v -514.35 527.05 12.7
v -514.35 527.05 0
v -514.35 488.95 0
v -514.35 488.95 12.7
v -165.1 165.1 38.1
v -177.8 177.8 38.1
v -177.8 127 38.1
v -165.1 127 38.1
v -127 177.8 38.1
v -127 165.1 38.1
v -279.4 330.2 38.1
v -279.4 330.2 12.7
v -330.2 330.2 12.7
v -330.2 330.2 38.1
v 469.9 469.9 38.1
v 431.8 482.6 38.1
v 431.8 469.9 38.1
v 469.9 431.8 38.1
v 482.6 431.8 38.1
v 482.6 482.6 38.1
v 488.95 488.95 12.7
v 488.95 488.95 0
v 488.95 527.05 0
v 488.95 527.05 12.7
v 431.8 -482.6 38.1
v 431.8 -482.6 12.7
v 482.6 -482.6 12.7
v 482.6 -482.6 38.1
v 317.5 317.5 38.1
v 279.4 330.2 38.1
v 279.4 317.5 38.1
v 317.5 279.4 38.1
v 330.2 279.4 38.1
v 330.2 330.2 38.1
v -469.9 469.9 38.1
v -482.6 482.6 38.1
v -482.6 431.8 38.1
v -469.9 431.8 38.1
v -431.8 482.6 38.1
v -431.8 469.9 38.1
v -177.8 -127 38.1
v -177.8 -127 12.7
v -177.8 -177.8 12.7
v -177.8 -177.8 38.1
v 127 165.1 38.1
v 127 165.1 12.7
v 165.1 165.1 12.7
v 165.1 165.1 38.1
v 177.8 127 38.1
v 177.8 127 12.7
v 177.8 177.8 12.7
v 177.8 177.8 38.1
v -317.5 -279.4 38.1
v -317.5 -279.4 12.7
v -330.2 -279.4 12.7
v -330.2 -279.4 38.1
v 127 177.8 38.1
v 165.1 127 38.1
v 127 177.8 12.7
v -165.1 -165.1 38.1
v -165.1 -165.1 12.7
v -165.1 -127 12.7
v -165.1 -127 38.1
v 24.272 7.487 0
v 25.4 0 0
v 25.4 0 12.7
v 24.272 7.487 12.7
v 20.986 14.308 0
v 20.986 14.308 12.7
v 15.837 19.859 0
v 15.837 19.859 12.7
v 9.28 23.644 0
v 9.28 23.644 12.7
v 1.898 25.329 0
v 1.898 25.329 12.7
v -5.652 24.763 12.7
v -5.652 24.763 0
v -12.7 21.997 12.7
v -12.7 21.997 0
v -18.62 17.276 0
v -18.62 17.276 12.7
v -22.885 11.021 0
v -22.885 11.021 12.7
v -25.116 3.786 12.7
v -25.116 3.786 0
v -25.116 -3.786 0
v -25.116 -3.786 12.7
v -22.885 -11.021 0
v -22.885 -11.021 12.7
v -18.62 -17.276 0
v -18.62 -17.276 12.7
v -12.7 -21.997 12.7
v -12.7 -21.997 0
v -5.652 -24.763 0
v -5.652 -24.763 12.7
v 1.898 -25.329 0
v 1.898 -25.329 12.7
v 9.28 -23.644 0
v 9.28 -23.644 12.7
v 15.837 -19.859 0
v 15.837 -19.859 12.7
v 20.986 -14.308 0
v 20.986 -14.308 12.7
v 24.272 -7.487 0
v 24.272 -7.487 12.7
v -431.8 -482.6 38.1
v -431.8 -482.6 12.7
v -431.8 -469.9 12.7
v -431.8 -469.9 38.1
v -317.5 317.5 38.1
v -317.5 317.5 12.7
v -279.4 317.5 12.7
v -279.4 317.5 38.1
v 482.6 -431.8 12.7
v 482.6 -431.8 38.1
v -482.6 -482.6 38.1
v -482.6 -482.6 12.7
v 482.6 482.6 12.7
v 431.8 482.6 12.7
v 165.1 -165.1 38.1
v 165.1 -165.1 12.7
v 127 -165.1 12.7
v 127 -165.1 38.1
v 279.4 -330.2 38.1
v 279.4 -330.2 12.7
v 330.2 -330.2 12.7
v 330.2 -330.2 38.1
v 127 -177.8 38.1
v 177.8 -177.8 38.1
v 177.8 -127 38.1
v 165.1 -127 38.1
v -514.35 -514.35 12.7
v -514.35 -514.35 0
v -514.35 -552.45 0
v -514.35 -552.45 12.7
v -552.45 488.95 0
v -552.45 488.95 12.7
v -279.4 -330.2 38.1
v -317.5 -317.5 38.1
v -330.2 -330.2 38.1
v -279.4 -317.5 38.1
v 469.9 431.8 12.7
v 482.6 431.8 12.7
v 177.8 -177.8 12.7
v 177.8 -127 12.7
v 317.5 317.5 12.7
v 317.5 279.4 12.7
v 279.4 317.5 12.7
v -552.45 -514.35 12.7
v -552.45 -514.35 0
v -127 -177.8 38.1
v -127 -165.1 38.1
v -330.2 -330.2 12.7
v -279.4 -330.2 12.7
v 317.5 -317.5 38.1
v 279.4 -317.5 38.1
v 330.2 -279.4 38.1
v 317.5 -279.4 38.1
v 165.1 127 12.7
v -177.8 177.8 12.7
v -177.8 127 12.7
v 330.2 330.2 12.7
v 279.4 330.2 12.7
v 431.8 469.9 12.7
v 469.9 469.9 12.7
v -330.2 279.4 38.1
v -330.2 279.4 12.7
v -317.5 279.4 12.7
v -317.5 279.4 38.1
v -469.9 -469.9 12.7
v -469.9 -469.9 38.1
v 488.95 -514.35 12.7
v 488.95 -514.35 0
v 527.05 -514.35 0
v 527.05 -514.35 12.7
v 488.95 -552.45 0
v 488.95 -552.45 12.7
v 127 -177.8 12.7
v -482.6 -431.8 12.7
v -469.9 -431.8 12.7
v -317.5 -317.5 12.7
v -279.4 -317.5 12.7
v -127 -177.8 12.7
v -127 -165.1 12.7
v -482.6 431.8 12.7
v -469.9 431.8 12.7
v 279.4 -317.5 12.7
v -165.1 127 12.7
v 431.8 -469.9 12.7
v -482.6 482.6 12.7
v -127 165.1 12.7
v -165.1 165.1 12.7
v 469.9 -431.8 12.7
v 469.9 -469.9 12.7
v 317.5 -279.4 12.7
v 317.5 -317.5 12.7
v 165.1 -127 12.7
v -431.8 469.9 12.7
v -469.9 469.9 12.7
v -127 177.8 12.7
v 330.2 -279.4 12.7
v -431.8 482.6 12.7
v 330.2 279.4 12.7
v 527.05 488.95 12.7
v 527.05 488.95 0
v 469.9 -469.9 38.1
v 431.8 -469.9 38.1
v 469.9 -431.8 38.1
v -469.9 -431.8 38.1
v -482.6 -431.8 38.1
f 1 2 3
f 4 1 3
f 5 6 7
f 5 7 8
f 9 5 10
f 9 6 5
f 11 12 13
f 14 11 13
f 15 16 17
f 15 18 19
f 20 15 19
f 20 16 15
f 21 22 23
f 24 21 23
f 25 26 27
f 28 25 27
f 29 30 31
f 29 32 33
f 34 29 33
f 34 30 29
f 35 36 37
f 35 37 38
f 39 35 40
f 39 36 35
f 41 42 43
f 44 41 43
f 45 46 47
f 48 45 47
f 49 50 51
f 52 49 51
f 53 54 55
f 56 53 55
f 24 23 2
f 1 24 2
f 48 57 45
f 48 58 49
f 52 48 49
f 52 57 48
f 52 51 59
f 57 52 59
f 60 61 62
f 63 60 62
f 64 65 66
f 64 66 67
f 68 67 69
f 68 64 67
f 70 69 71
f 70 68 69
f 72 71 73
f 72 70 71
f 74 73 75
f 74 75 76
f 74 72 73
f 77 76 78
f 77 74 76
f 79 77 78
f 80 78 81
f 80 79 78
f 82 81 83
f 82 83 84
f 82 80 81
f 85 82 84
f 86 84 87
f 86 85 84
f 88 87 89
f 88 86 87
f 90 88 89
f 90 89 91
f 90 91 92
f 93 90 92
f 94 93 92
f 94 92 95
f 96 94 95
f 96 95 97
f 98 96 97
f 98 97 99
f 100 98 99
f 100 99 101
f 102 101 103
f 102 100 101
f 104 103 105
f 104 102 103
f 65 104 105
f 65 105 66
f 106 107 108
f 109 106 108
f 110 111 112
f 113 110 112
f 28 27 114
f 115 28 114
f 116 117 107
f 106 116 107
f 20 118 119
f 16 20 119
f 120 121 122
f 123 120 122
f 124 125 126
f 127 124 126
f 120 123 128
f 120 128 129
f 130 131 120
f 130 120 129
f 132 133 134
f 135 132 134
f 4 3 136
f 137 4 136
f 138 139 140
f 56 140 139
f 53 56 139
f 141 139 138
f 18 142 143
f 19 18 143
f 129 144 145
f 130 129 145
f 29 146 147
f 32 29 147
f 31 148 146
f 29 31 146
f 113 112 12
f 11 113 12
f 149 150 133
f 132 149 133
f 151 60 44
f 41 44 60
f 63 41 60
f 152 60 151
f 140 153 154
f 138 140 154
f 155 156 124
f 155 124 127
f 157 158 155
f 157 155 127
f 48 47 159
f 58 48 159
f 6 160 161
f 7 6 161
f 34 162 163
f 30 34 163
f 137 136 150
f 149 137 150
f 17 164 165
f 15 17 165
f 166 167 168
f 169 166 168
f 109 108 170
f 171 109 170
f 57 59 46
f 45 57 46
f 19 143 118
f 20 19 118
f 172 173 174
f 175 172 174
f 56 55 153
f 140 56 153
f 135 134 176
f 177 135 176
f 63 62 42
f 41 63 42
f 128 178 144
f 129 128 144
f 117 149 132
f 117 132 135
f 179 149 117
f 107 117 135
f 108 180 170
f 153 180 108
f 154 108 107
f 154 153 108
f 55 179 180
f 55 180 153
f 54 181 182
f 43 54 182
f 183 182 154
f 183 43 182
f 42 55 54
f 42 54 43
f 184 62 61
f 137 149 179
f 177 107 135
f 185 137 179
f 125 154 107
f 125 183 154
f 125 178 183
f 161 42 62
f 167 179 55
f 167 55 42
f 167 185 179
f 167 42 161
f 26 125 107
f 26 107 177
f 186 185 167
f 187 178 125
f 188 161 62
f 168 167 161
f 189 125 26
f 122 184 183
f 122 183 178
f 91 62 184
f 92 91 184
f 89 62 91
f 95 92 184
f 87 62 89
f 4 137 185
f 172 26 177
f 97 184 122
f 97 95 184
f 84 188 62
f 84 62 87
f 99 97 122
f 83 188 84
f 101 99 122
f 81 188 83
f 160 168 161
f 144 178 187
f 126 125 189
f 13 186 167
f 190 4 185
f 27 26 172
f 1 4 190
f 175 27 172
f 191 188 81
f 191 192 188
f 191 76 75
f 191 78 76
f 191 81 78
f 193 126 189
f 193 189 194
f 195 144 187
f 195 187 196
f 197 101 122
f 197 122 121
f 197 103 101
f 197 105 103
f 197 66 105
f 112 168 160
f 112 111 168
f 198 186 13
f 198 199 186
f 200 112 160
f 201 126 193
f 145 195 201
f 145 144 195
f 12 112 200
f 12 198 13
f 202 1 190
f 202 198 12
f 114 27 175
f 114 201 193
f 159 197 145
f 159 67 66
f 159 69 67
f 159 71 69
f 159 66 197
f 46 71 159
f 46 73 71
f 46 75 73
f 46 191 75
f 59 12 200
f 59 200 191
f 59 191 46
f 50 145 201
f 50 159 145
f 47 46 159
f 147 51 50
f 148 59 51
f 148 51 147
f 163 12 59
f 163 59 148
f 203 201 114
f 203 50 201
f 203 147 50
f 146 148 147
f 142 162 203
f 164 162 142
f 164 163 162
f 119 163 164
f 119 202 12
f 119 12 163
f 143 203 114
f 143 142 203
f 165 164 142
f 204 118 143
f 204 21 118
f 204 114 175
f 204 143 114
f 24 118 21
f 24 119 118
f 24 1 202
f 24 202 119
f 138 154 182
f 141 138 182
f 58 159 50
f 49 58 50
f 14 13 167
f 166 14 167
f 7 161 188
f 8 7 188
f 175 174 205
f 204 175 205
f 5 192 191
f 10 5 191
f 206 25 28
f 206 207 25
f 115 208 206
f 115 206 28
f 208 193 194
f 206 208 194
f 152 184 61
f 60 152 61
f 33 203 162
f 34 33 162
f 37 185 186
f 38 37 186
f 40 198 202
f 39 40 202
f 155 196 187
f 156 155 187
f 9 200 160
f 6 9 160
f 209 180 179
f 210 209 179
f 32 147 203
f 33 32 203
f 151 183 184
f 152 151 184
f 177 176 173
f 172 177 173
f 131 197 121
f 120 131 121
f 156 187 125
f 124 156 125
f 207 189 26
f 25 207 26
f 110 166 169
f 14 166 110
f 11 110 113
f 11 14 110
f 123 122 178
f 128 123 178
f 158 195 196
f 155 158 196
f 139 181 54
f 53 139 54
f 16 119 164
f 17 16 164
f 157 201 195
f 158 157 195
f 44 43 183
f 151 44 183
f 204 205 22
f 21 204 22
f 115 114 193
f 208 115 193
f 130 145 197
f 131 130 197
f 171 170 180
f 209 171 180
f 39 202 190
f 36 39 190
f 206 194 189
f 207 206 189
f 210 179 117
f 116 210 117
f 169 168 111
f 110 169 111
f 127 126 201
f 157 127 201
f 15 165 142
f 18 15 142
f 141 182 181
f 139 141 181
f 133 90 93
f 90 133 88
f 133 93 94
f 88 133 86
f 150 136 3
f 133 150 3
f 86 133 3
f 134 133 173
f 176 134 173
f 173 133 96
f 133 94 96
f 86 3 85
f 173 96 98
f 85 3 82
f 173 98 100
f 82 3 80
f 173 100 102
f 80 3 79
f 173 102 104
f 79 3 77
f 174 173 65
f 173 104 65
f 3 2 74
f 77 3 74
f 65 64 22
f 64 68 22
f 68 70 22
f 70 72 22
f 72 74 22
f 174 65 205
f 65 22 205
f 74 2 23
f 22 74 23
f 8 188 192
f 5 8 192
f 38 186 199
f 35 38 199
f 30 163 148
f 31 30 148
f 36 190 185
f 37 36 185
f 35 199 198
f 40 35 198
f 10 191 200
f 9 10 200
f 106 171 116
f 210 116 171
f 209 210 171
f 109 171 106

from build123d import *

# Parameters (mm, degrees)
F0_R     = 25.4
F1_DEPTH = 12.7
F3_DEPTH = 25.4


with BuildPart() as f1:
    # F0 (on Top) → F1 (new body)
    with BuildSketch(Plane.XY):
        Polygon((-514.35, 488.95), (-552.45, 488.95), (-552.45, -514.35), (-514.35, -514.35), (-514.35, -552.45), (488.95, -552.45), (488.95, -514.35), (527.05, -514.35), (527.05, 488.95), (488.95, 488.95), (488.95, 527.05), (-514.35, 527.05), align=None)
        Circle(F0_R, mode=Mode.SUBTRACT)
    extrude(amount=F1_DEPTH)

    # F2 (on face) → F3 (join)
    with BuildSketch(Plane.XY.offset(12.7)):
        Polygon((-330.2, 330.2), (-330.2, 279.4), (-317.5, 279.4), (-317.5, 317.5), (-279.4, 317.5), (-279.4, 330.2), align=None)
        Polygon((-127, 177.8), (-177.8, 177.8), (-177.8, 127), (-165.1, 127), (-165.1, 165.1), (-127, 165.1), align=None)
        Polygon((-165.1, -127), (-177.8, -127), (-177.8, -177.8), (-127, -177.8), (-127, -165.1), (-165.1, -165.1), align=None)
        Polygon((177.8, 177.8), (127, 177.8), (127, 165.1), (165.1, 165.1), (165.1, 127), (177.8, 127), align=None)
        Polygon((330.2, 330.2), (279.4, 330.2), (279.4, 317.5), (317.5, 317.5), (317.5, 279.4), (330.2, 279.4), align=None)
        Polygon((177.8, -177.8), (177.8, -127), (165.1, -127), (165.1, -165.1), (127, -165.1), (127, -177.8), align=None)
        Polygon((482.6, 482.6), (431.8, 482.6), (431.8, 469.9), (469.9, 469.9), (469.9, 431.8), (482.6, 431.8), align=None)
        Polygon((-431.8, 482.6), (-482.6, 482.6), (-482.6, 431.8), (-469.9, 431.8), (-469.9, 469.9), (-431.8, 469.9), align=None)
        Polygon((-317.5, -279.4), (-330.2, -279.4), (-330.2, -330.2), (-279.4, -330.2), (-279.4, -317.5), (-317.5, -317.5), align=None)
        Polygon((-469.9, -431.8), (-482.6, -431.8), (-482.6, -482.6), (-431.8, -482.6), (-431.8, -469.9), (-469.9, -469.9), align=None)
        Polygon((330.2, -330.2), (330.2, -279.4), (317.5, -279.4), (317.5, -317.5), (279.4, -317.5), (279.4, -330.2), align=None)
        Polygon((431.8, -482.6), (482.6, -482.6), (482.6, -431.8), (469.9, -431.8), (469.9, -469.9), (431.8, -469.9), align=None)
    extrude(amount=F3_DEPTH)


solid = f1.part
